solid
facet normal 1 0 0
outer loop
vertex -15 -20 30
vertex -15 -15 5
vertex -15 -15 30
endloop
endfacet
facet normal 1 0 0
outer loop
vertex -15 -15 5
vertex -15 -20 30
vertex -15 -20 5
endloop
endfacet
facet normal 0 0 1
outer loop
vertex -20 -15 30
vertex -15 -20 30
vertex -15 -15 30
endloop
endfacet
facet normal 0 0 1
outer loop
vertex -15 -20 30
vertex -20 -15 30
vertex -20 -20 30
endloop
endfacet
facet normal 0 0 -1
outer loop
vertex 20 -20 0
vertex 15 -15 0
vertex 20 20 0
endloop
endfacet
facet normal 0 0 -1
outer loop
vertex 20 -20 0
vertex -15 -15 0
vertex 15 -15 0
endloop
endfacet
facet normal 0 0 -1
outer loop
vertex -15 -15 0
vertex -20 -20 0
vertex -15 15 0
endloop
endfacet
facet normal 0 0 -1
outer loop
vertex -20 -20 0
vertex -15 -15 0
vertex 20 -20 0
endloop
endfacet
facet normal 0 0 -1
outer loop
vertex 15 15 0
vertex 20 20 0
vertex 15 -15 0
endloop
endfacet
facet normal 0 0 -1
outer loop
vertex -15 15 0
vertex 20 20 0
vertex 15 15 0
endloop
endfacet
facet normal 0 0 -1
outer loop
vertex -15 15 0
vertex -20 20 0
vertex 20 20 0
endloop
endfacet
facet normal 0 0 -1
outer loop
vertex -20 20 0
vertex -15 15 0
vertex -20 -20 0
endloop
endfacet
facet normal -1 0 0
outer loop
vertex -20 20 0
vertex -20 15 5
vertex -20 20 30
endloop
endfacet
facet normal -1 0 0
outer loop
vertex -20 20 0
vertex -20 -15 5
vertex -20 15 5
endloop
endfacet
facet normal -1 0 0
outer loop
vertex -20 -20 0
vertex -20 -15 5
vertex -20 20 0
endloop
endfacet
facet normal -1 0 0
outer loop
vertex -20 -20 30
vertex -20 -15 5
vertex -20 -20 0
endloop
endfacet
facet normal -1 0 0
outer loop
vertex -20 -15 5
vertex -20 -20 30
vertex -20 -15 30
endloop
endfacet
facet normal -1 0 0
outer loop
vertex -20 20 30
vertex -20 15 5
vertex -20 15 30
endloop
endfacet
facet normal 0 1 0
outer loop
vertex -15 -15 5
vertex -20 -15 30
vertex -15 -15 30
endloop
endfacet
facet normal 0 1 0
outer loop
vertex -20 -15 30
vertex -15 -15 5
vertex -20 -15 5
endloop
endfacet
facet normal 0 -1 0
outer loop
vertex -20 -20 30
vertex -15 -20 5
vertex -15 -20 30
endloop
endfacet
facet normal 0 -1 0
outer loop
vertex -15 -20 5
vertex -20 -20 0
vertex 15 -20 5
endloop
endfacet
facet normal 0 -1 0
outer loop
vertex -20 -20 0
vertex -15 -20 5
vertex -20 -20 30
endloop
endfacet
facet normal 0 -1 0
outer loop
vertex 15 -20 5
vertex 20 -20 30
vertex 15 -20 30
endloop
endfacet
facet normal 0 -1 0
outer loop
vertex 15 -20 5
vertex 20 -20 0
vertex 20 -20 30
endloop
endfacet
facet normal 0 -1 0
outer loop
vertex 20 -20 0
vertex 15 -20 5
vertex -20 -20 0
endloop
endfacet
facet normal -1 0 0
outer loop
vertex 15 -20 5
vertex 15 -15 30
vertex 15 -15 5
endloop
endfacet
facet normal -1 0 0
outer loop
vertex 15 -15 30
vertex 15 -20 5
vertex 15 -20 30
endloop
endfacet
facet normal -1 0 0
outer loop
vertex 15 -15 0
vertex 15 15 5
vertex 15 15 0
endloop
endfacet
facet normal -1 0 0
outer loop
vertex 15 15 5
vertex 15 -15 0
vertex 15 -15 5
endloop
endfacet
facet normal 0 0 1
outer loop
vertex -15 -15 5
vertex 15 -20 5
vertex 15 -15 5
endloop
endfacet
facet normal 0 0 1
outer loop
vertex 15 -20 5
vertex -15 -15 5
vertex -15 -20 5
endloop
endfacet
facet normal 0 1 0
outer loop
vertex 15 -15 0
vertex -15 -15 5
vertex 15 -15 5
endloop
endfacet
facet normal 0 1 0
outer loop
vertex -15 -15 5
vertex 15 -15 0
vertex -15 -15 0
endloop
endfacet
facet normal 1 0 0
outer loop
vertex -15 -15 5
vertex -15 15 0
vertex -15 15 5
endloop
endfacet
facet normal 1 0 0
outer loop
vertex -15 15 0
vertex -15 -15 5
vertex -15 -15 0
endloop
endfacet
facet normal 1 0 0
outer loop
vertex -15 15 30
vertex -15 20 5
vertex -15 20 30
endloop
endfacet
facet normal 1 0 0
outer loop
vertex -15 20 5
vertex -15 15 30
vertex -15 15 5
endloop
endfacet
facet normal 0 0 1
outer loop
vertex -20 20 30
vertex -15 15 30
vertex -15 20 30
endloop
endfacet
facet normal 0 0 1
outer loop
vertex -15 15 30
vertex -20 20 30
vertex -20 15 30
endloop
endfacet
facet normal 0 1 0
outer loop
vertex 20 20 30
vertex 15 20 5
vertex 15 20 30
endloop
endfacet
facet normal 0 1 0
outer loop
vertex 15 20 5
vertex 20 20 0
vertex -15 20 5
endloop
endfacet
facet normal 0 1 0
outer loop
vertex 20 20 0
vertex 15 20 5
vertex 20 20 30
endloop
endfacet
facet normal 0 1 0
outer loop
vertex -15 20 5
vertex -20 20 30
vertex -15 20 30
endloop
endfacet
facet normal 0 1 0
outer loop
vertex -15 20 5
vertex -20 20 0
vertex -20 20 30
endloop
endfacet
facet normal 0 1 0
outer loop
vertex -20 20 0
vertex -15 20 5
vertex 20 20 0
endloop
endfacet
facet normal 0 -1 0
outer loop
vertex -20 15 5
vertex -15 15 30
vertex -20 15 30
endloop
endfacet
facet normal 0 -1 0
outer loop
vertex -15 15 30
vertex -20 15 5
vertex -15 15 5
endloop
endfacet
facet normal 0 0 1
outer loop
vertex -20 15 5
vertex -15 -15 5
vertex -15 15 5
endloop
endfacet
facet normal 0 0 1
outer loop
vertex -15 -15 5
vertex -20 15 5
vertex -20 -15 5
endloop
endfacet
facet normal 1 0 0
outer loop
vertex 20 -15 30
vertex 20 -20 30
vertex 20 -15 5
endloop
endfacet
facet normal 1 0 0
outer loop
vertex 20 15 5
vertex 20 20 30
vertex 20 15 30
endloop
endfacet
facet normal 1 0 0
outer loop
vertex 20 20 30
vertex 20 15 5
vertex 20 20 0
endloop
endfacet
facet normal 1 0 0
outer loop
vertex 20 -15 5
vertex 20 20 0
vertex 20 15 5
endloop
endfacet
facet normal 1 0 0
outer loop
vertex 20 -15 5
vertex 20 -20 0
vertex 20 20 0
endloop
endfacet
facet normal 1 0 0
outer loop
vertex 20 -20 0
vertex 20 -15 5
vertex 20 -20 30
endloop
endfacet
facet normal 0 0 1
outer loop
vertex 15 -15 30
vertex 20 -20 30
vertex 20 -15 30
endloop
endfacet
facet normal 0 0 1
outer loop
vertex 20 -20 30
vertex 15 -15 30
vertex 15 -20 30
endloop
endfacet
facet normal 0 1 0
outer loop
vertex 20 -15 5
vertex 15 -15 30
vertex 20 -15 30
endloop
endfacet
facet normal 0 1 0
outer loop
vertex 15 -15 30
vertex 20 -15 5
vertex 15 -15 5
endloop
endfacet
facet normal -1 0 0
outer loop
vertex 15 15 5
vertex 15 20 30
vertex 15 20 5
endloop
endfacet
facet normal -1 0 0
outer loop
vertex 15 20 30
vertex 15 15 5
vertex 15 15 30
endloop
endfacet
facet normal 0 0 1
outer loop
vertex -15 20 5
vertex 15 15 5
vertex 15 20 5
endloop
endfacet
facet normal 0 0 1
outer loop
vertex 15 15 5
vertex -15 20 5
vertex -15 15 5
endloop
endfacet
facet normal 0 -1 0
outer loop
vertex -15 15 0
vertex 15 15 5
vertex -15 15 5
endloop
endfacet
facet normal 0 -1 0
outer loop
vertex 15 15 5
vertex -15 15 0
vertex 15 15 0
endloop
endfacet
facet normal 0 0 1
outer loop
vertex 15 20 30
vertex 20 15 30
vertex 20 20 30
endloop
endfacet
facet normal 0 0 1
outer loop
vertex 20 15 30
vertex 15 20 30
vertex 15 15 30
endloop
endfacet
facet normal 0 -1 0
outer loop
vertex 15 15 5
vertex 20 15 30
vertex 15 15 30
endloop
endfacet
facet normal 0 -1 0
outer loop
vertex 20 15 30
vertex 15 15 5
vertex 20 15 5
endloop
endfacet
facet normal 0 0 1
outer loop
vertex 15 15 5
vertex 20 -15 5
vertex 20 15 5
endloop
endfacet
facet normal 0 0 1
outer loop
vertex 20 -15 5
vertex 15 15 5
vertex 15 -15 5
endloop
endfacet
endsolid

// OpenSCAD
/* [Piliers] */
// Epaisseur des piliers 
piliersEP = 5;
// Hauteur des piliers
piliersHT = 30;


/* [Traverses] */
// Longueurs des traverses
traversesLG = 30;
// Hauteurs des traverses
traversesHT = 5;
// Epaisseurs des traverses
traversesEP = 5;

union ()
{
    for (x = [-1,1])
    {
        for (y = [-1,1])
        {
            // --- Piliers ---
            ecart = traversesLG/2+piliersEP/2;
            translate([ecart*x, ecart*y, piliersHT/2])
            cube([piliersEP, piliersEP, piliersHT], center=true);
            
            // --- Traverses ---
            translate([(y < 0 ? 0 : x)*ecart, (y > 0 ? 0 : x)*ecart, traversesHT/2])
            rotate([0,0,(y < 0 ? 0 : x*90)])
            cube([traversesLG, traversesEP, traversesHT], center=true);
        }
    }
}
